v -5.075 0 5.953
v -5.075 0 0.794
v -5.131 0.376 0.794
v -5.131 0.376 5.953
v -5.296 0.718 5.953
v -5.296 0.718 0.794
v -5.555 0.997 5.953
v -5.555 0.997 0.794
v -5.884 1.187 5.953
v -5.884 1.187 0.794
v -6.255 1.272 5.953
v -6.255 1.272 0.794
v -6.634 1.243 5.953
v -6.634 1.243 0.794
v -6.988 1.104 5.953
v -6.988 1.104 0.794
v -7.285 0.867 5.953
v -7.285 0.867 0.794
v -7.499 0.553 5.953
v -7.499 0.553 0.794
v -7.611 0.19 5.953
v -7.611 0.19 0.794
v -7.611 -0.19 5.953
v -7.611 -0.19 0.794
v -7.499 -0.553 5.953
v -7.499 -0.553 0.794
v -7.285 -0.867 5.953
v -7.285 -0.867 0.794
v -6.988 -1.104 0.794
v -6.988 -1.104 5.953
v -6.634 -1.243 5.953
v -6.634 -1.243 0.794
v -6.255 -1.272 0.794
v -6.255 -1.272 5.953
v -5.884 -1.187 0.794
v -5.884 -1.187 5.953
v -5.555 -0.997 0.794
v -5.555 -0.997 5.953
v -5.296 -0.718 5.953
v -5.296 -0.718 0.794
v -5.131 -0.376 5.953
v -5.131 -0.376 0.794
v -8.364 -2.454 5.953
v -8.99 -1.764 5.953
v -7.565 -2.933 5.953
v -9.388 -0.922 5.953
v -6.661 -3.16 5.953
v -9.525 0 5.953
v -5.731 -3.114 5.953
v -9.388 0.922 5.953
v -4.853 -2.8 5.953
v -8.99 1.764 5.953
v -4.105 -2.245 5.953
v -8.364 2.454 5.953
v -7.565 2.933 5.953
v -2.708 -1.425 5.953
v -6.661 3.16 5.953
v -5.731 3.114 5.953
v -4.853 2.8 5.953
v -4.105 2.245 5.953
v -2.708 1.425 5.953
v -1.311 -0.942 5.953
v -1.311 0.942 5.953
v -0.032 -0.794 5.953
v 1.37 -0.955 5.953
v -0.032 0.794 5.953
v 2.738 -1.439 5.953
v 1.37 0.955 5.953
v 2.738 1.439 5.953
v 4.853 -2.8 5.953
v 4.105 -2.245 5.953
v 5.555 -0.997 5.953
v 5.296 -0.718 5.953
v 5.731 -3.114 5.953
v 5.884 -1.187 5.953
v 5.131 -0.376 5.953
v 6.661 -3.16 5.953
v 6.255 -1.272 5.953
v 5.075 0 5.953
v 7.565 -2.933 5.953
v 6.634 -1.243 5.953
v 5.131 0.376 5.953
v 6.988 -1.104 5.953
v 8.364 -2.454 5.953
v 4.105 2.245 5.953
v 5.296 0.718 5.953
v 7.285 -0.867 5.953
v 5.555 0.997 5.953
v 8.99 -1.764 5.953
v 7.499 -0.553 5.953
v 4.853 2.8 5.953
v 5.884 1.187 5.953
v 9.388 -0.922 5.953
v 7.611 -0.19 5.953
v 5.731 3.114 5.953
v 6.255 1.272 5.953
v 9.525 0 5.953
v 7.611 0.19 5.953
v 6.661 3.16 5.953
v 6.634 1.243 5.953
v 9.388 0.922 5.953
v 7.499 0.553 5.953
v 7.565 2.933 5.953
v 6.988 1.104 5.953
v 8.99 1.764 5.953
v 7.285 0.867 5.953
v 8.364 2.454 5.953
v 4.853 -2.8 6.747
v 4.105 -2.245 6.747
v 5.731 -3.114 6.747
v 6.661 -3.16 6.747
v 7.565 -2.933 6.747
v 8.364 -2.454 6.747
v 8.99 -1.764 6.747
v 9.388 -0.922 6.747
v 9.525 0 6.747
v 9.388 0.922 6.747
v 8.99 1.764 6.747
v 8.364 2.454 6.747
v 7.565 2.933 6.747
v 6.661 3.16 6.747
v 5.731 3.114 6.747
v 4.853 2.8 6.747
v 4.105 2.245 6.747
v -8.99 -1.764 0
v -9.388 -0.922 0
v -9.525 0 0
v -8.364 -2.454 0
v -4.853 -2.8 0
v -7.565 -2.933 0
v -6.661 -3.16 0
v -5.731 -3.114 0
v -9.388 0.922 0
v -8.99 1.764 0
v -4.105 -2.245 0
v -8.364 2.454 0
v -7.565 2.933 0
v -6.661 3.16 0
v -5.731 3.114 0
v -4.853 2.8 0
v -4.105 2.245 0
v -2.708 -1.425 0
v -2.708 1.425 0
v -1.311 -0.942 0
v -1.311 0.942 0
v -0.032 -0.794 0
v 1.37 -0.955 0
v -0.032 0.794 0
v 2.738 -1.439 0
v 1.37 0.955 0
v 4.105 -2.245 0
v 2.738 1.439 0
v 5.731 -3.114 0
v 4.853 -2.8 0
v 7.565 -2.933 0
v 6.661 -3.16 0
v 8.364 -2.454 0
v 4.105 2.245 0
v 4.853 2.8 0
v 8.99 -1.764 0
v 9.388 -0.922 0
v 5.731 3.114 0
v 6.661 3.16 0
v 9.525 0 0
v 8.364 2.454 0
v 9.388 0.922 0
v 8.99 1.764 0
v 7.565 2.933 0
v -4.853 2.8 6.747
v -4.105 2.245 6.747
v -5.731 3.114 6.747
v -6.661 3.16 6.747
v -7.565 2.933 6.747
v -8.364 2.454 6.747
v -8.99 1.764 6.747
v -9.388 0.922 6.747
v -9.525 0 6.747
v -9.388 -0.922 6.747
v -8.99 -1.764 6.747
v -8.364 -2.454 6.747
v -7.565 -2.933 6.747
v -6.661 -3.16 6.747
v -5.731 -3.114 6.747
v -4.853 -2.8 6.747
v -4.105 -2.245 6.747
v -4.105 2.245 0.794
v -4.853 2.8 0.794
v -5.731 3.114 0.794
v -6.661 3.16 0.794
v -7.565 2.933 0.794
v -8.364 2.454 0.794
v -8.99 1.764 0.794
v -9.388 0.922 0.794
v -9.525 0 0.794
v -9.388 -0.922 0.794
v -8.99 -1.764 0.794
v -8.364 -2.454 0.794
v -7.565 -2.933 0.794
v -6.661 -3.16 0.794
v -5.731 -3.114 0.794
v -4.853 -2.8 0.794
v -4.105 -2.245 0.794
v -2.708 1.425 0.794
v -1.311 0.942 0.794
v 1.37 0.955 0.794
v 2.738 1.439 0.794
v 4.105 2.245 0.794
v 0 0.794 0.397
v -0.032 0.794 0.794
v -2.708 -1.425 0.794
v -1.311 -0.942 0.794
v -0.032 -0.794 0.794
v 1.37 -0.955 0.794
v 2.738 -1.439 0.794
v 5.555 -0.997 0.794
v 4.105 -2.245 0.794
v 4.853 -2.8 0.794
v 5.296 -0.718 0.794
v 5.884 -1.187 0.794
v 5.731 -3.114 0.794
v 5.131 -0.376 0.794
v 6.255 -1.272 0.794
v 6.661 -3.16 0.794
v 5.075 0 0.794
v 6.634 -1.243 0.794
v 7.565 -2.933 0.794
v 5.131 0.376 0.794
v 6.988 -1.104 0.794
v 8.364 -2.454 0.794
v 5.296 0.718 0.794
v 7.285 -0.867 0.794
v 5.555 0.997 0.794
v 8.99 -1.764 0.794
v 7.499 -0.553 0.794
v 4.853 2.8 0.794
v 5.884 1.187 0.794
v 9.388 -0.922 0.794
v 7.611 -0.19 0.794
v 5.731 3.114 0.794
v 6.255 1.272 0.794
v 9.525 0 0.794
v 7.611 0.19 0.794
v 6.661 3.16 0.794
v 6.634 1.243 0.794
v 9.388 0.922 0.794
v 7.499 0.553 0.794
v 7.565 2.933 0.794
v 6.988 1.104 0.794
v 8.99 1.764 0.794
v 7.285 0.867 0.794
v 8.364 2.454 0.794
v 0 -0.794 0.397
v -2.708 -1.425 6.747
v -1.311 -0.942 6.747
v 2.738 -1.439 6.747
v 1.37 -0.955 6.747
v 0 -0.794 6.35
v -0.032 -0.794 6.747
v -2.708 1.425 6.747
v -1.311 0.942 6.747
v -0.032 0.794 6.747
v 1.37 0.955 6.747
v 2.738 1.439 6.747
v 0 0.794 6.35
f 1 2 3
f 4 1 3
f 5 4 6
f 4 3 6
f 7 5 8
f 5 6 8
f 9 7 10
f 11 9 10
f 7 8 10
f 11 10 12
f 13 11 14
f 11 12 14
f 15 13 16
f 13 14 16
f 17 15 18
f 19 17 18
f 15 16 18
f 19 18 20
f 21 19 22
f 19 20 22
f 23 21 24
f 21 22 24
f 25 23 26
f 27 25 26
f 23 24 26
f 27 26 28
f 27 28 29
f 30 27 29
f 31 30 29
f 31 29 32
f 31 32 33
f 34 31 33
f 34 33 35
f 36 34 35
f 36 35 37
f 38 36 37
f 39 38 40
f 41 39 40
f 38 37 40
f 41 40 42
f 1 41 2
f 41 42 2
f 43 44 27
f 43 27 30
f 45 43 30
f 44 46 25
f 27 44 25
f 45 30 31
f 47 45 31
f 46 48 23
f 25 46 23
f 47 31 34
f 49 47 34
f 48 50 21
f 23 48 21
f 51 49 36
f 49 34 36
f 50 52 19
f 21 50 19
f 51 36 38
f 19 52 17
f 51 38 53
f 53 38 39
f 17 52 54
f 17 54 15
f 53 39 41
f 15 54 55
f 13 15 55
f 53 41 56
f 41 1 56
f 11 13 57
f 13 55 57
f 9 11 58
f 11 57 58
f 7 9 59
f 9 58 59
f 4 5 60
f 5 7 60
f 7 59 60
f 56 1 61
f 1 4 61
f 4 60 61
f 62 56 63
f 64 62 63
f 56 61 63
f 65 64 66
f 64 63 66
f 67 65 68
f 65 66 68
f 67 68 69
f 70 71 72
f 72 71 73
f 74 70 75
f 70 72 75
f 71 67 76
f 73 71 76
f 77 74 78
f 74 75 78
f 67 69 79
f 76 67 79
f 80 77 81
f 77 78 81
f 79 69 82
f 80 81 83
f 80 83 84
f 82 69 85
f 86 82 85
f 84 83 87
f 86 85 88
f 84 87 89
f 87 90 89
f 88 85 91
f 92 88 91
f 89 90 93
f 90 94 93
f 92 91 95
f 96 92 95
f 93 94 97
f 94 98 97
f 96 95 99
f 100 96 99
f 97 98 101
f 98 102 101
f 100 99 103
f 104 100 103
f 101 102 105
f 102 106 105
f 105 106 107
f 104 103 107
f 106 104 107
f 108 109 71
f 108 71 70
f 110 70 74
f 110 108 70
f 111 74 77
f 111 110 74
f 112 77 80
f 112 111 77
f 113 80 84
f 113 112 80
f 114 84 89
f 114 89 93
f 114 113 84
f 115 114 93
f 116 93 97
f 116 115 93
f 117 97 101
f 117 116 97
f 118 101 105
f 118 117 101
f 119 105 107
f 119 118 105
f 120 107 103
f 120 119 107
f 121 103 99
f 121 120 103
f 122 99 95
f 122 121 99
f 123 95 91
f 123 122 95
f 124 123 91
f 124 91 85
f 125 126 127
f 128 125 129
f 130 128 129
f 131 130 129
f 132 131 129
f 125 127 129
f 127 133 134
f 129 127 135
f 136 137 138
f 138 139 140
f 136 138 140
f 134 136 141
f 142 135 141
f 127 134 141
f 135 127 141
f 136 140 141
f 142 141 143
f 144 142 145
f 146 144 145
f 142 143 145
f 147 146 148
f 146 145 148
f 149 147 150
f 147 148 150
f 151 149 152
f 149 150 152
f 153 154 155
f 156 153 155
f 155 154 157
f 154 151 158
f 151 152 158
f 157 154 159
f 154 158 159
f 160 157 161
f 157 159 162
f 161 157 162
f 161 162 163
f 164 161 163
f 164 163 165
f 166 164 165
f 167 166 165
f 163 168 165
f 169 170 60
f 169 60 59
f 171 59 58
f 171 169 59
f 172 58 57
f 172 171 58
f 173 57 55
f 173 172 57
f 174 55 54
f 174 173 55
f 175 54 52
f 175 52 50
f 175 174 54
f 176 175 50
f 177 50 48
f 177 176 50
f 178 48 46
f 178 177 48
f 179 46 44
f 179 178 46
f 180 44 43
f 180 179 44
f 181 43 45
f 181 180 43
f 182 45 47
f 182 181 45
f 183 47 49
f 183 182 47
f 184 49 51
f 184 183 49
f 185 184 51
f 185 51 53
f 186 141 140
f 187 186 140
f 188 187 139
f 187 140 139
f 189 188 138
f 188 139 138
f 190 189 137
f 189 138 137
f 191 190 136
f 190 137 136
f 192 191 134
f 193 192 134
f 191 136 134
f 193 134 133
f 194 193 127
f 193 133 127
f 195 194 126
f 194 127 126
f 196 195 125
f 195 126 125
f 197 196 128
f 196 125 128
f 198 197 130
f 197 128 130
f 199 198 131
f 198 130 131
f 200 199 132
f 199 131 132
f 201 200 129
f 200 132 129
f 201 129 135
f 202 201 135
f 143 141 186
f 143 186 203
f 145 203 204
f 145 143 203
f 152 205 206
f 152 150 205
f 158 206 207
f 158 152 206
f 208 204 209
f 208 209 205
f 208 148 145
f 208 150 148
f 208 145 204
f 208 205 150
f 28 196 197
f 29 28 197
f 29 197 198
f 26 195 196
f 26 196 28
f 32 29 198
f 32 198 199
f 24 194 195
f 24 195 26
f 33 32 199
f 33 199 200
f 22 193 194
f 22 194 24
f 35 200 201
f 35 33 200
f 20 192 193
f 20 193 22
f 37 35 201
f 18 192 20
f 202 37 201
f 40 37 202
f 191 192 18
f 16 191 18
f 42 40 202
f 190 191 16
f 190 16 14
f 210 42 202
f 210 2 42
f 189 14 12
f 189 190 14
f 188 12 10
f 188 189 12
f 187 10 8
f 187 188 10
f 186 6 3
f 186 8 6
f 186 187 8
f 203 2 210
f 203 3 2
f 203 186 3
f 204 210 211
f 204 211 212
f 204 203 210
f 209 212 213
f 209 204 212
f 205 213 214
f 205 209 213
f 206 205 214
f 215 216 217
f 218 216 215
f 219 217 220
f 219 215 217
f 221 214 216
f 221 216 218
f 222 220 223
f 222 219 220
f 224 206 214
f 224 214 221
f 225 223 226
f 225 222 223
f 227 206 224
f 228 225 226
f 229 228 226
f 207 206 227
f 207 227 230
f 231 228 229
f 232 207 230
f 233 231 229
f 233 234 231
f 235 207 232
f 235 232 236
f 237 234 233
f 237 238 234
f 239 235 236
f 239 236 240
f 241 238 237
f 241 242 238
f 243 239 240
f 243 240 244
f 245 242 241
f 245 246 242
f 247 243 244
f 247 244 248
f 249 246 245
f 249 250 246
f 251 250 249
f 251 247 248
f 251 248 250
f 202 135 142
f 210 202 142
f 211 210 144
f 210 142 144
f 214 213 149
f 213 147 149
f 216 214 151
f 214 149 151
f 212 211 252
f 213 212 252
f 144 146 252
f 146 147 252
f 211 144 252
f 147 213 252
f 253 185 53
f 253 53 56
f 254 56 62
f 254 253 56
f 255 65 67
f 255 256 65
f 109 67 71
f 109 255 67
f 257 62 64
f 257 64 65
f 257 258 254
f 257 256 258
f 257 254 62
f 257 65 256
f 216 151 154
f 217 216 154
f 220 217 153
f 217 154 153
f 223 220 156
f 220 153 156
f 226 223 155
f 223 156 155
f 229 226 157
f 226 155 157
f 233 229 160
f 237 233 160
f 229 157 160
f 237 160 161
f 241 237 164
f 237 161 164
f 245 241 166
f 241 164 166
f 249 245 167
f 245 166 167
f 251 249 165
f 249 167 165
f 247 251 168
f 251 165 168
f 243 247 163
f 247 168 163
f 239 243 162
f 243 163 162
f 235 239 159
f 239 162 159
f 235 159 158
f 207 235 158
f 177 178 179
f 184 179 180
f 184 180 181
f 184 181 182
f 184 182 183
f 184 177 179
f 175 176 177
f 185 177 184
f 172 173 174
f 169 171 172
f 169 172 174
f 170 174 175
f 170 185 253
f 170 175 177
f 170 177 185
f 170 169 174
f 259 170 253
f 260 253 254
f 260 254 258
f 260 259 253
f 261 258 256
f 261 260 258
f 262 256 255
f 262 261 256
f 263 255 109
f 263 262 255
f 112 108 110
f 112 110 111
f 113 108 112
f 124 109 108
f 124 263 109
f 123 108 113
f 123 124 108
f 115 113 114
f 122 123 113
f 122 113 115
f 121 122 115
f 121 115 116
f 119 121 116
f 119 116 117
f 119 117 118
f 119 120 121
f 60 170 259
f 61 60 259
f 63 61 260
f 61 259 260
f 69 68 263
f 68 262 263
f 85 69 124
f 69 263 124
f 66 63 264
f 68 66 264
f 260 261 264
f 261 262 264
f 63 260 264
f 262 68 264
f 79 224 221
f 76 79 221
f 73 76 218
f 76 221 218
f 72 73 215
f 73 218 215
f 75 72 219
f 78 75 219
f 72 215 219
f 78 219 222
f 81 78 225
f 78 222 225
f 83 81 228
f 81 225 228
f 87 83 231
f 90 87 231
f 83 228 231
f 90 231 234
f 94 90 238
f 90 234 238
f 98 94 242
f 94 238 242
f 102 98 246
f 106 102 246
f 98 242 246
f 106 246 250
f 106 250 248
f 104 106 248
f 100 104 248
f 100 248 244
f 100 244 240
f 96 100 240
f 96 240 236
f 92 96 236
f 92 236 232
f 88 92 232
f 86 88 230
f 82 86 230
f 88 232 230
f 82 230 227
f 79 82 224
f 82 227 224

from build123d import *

# Parameters (mm, degrees)
BOSS_EXTRUDE1_DEPTH = 0.79375
SKETCH2_R           = 1.275343429
BOSS_EXTRUDE2_DEPTH = 5.159375


with BuildPart() as part:
    # Sketch1 → Boss-Extrude1 (new body)
    with BuildSketch(Plane.XY):
        with BuildLine():
            ThreePointArc((-4.10493597, 2.24506403), (-9.525, 0), (-4.10493597, -2.24506403))
            add(Edge.make_bspline(
                [(-4.10493597, -2.24506403), (0, 0.65756403), (4.10493597, -2.24506403)],
                knots=[0, 0, 0, 1, 1, 1], degree=2))
            ThreePointArc((4.10493597, -2.24506403), (9.525, 0), (4.10493597, 2.24506403))
            add(Edge.make_bspline(
                [(-4.10493597, 2.24506403), (0, -0.65756403), (4.10493597, 2.24506403)],
                knots=[0, 0, 0, 1, 1, 1], degree=2))
        make_face()
    boss_extrude1 = extrude(amount=BOSS_EXTRUDE1_DEPTH)

    # Sketch2 → Boss-Extrude2 (add)
    with BuildSketch(Plane.XY.offset(0.79375)):
        with Locations((-6.35, 0)):
            Circle(SKETCH2_R)
        with Locations(Location((6.35, 0, 0), (0, 0, 180))):
            Circle(SKETCH2_R)
    extrude(amount=BOSS_EXTRUDE2_DEPTH)

    # Mirror1: Boss-Extrude1 across plane
    add(boss_extrude1.mirror(Plane.XY.offset(3.3734375)))


solid = part.part
